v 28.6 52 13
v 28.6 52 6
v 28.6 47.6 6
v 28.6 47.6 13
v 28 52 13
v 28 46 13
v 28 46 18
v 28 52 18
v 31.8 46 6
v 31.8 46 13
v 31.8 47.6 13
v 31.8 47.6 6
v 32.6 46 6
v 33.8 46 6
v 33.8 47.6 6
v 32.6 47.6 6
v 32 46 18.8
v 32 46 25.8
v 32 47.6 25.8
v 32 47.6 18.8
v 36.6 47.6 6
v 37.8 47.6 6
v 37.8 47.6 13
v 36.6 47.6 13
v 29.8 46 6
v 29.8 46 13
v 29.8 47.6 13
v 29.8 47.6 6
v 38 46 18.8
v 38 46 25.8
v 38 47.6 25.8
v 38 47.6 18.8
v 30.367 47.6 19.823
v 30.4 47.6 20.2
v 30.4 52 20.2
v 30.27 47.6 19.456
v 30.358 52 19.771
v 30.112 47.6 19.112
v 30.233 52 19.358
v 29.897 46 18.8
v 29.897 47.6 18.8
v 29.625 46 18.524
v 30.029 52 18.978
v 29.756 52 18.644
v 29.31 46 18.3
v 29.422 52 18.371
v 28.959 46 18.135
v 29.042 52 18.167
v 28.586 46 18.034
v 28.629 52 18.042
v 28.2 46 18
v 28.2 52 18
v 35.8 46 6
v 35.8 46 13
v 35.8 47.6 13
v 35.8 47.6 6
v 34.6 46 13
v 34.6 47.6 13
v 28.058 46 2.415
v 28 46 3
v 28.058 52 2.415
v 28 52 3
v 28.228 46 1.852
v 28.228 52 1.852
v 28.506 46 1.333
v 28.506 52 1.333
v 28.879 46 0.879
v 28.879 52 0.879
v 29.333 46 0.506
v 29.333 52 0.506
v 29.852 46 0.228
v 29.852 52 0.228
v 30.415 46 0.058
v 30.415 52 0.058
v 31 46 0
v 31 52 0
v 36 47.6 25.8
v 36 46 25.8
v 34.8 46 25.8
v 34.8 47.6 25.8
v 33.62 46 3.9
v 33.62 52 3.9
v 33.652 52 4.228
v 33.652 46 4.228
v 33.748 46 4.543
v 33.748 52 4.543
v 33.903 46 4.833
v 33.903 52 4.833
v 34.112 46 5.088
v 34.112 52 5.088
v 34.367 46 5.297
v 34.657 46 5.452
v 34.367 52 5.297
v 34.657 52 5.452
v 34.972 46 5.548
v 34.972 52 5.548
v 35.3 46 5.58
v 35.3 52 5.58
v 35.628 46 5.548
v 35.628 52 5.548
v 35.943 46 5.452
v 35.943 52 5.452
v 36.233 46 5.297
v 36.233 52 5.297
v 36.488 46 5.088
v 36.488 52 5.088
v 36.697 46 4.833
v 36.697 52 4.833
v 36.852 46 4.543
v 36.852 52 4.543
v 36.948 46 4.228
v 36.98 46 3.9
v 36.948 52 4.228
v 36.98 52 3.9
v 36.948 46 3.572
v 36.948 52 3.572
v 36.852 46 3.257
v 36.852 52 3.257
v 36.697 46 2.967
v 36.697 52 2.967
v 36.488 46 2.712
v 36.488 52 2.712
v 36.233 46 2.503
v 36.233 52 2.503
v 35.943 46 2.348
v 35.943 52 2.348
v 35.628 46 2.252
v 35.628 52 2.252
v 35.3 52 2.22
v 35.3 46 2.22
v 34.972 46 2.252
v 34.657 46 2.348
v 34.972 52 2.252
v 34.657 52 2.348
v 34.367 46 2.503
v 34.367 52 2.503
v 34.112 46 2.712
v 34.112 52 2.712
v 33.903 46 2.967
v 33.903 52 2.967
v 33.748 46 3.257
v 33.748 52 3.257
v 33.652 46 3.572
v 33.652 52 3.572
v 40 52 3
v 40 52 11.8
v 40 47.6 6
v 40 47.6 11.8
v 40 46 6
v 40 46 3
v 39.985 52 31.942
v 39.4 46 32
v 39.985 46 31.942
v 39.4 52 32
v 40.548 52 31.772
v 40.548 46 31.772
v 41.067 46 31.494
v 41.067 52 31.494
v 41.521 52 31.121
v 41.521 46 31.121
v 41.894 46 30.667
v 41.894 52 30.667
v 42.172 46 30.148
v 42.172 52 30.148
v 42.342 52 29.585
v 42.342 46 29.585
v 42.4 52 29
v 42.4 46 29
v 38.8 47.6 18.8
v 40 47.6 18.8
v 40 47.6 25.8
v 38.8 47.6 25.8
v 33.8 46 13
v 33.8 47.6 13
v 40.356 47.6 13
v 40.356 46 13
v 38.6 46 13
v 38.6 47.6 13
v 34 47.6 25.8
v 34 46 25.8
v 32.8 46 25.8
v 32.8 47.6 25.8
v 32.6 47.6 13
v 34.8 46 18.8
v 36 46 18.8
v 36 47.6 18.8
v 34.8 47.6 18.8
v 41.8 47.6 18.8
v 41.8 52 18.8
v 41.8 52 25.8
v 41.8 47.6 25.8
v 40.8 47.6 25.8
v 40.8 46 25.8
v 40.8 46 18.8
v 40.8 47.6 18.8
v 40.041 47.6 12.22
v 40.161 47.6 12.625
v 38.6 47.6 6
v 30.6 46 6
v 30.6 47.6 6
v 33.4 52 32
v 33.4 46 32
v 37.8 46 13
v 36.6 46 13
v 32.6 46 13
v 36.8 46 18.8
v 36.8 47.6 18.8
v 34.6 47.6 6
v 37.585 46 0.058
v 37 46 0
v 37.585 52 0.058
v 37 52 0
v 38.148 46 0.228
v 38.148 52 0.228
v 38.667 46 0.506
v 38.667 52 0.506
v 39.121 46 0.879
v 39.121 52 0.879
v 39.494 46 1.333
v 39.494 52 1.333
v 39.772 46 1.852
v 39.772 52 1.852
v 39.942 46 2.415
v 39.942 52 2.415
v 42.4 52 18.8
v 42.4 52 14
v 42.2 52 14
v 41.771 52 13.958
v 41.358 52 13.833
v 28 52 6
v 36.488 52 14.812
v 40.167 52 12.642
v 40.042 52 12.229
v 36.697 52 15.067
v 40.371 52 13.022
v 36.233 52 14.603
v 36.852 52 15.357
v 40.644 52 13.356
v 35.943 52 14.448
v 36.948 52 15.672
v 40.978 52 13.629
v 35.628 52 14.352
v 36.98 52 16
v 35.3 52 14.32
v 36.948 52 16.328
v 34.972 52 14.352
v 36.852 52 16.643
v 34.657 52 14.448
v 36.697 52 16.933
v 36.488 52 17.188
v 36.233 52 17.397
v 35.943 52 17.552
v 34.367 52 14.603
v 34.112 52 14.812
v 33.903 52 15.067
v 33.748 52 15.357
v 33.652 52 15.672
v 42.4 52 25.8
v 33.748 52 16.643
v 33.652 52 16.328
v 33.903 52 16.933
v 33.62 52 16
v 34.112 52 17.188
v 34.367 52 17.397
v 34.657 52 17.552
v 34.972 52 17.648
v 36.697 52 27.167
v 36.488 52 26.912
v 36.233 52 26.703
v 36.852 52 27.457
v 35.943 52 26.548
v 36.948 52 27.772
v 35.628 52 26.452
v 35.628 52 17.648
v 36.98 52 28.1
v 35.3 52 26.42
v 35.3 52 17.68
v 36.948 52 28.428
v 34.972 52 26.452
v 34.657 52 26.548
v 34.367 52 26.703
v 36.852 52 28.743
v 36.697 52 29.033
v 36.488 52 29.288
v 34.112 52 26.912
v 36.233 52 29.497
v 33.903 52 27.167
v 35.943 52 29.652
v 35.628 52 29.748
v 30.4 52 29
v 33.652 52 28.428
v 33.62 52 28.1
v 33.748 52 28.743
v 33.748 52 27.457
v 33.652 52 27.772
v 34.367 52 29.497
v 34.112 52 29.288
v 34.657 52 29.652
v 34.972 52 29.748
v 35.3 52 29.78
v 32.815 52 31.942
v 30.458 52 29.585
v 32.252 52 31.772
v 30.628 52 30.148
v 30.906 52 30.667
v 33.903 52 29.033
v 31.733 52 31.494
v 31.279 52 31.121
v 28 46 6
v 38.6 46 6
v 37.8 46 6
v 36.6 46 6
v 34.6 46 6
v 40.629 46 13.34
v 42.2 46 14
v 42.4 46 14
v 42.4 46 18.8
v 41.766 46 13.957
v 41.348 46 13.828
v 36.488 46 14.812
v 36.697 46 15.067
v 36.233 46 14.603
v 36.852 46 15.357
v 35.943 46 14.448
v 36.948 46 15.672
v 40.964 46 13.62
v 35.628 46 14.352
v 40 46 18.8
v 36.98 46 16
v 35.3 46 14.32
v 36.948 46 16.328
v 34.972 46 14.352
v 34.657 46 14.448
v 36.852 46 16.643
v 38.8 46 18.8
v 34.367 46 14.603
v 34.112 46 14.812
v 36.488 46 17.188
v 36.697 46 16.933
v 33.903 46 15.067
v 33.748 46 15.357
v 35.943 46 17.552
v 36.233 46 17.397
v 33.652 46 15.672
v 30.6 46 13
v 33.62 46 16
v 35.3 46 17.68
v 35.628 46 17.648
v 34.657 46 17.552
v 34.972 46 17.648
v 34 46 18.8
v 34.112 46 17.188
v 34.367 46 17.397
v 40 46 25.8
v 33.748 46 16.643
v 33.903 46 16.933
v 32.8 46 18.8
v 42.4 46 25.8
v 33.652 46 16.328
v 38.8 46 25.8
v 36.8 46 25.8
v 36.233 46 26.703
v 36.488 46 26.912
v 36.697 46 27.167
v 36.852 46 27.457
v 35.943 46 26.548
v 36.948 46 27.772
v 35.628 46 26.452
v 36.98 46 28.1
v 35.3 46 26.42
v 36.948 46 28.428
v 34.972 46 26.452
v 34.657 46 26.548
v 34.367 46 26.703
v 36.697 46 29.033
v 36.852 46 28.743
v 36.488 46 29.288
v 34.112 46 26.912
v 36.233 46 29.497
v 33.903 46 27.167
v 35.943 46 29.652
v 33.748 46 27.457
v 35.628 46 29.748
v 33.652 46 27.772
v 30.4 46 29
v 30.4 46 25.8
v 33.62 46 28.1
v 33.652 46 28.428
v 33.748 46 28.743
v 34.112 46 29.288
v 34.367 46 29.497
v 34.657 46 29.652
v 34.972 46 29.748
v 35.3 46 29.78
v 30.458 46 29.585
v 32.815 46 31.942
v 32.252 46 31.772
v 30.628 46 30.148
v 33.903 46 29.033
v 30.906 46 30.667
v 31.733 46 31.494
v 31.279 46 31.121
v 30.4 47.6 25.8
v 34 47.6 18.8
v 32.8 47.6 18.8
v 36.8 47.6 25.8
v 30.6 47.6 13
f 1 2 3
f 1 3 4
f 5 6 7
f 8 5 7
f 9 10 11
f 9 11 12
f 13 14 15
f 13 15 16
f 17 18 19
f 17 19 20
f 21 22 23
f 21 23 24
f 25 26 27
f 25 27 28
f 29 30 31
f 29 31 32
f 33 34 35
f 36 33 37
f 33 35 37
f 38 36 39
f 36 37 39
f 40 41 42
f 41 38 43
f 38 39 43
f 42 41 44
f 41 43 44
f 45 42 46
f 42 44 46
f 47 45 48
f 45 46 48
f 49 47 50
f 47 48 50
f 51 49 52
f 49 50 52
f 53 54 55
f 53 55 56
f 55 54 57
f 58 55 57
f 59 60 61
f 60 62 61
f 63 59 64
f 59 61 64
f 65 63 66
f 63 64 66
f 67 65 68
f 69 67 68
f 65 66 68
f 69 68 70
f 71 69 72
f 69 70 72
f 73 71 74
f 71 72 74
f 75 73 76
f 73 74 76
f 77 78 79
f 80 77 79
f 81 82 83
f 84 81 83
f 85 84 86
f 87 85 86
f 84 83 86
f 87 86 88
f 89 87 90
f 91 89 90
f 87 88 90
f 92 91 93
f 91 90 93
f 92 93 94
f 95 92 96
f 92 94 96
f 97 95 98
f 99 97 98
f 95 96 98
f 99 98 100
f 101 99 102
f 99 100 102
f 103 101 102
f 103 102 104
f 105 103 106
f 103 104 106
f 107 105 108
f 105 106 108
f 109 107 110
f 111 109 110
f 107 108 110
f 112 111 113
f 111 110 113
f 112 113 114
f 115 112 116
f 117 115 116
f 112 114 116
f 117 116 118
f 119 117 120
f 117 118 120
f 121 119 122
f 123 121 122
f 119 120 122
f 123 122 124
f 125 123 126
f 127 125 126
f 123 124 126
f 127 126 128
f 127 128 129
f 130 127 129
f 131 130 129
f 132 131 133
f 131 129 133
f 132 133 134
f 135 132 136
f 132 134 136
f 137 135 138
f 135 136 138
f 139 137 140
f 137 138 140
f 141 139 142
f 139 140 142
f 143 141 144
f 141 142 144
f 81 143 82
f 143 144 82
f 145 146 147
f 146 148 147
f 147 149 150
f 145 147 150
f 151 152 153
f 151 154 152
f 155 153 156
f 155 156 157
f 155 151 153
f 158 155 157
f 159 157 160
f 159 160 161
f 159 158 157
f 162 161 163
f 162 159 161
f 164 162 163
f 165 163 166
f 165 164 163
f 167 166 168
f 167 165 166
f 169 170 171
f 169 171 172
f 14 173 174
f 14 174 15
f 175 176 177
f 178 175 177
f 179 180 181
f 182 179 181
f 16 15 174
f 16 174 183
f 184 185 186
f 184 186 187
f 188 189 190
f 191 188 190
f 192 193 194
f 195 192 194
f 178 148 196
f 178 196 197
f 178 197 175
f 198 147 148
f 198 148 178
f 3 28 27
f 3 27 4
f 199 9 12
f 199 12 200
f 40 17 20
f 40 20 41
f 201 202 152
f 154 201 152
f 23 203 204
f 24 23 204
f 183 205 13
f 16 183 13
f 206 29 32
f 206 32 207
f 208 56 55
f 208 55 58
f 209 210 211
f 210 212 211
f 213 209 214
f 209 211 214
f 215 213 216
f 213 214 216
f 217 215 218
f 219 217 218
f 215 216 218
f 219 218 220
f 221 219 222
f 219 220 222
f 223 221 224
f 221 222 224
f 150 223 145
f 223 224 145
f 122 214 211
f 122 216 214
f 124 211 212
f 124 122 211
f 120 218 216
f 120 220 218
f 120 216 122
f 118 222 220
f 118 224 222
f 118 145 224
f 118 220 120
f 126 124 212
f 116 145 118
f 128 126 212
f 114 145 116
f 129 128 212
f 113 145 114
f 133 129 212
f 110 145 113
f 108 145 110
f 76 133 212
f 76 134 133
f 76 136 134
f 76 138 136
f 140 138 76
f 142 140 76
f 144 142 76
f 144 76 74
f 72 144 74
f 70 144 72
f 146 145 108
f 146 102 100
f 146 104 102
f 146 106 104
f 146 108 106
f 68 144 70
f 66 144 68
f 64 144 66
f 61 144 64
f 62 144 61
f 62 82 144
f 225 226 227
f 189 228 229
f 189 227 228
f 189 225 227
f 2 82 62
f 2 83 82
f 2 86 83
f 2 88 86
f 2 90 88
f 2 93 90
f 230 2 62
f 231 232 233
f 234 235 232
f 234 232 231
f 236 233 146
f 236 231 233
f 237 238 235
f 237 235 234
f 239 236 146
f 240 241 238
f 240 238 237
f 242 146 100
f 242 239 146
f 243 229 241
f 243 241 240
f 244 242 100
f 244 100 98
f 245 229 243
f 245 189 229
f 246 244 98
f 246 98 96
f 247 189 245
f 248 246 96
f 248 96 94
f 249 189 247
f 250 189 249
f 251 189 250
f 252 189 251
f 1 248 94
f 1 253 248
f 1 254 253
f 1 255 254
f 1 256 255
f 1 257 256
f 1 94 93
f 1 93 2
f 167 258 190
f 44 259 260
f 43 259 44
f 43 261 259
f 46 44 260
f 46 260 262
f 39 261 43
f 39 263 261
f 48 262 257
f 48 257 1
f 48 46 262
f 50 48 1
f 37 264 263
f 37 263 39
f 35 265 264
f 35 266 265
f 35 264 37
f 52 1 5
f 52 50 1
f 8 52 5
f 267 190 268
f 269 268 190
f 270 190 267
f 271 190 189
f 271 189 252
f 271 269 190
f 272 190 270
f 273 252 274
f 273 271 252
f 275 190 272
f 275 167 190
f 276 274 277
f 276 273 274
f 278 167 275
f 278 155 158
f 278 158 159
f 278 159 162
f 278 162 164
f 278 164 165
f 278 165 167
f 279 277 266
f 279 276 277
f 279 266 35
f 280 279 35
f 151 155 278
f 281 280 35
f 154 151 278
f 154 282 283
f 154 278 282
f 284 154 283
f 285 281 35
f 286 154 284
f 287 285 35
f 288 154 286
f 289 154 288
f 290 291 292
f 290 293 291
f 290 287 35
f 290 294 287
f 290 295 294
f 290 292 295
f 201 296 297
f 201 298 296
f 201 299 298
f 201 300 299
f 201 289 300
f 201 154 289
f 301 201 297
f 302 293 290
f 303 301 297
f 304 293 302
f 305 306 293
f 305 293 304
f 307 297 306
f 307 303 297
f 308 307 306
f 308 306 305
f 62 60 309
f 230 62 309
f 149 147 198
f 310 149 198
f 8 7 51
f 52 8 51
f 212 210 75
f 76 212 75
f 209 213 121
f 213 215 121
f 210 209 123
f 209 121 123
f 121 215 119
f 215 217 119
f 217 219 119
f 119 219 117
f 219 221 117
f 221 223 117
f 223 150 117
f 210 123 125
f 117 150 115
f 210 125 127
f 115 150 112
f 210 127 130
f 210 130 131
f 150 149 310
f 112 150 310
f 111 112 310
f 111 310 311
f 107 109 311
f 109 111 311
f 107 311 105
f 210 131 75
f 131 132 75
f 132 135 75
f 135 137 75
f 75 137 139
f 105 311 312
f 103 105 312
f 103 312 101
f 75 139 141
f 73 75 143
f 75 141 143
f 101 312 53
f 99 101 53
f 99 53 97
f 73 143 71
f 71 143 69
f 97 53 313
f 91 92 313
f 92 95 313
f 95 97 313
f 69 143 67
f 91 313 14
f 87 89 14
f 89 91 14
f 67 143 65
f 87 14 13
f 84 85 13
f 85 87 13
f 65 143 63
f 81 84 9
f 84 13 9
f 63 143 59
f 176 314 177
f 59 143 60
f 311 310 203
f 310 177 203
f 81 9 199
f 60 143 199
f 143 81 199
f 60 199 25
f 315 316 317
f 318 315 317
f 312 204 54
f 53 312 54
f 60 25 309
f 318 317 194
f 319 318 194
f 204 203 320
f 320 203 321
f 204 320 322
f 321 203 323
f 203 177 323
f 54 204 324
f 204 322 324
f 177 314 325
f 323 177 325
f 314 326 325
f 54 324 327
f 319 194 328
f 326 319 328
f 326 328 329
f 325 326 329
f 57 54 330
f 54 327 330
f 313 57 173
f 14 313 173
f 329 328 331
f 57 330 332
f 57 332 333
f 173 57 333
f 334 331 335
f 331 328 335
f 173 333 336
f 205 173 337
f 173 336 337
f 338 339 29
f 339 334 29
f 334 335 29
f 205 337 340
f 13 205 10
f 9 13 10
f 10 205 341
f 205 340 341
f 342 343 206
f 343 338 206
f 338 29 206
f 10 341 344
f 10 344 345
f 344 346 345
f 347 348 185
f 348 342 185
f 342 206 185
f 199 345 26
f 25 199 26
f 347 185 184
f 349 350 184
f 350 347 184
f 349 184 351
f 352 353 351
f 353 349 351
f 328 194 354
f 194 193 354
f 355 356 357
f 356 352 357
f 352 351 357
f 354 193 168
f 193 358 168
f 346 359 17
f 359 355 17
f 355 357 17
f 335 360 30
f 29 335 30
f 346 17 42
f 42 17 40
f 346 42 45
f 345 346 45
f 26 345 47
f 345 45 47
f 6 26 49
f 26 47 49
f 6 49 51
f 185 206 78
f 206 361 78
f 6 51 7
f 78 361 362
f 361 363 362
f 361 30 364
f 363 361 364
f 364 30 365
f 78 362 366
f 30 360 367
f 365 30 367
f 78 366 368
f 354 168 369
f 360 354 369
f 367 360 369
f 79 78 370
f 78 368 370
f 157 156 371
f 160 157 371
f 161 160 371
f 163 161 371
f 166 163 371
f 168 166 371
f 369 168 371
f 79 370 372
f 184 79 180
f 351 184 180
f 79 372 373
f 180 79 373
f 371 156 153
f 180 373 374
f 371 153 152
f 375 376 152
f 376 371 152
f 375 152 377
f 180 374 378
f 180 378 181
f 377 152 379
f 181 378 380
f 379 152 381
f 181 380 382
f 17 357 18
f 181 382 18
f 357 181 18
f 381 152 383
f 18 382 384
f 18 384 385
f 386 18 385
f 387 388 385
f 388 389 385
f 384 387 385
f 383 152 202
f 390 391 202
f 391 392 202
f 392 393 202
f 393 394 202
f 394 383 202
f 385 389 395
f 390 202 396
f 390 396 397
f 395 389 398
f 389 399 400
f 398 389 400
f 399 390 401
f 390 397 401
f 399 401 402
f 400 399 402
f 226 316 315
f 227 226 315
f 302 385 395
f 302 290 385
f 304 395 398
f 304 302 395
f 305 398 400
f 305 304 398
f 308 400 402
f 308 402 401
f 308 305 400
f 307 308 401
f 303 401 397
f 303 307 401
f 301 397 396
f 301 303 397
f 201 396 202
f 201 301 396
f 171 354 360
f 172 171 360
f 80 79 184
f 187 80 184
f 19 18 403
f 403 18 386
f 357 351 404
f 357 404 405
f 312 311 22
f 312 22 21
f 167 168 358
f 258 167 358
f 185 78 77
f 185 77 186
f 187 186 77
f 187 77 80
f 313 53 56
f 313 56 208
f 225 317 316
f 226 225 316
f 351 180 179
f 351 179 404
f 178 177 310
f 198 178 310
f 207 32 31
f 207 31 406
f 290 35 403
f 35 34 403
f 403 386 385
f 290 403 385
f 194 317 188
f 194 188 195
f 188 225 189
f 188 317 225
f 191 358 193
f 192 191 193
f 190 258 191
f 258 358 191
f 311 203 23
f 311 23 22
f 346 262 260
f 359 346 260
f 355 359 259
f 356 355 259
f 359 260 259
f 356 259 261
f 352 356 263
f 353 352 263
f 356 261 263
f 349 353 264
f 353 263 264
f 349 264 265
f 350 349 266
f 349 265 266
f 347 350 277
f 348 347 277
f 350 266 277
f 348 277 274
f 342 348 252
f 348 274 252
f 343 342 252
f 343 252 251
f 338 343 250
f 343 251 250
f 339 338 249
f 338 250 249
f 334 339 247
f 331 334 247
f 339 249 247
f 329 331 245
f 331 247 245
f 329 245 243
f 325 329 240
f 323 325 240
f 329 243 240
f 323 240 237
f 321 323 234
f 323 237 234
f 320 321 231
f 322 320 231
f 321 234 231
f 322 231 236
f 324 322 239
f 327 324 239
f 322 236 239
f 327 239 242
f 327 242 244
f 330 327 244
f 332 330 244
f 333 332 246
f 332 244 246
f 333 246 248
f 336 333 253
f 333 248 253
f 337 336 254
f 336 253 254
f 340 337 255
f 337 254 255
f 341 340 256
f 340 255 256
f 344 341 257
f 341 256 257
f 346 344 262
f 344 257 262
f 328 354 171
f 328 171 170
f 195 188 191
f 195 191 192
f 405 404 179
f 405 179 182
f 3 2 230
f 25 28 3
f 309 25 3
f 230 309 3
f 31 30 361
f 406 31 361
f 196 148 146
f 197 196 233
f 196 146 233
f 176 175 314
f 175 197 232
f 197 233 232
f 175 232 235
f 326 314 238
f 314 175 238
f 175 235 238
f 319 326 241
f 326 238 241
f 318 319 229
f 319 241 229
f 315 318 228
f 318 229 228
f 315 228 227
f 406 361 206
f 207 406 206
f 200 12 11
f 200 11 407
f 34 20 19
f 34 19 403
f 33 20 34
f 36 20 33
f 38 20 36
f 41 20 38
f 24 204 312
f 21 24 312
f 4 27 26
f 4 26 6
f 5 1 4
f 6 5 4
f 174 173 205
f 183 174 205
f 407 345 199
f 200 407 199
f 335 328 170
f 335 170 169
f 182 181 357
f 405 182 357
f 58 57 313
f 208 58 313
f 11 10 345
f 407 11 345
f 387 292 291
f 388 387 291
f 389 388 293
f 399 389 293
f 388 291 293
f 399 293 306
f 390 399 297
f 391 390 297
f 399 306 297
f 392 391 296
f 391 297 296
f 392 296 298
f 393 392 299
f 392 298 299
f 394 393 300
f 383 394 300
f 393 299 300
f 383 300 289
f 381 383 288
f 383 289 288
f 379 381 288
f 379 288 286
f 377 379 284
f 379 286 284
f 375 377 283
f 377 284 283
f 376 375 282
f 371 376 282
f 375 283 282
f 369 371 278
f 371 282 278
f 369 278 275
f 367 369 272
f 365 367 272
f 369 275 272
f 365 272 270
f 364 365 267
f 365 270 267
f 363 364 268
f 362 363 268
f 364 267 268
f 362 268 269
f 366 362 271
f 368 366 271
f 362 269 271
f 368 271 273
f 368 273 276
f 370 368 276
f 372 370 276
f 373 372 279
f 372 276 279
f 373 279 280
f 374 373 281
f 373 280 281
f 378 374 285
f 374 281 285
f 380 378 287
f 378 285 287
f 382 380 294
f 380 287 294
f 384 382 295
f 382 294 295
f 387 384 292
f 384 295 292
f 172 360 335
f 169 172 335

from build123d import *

# Parameters (mm, degrees)
PAD_DEPTH       = 6
SKETCH018_R     = 1.68
POCKET_DEPTH    = 6
SKETCH019_W     = 0.6
SKETCH019_H     = 7
POCKET001_DEPTH = 6
SKETCH020_W     = 1.2
SKETCH020_H     = 7
SKETCH020_W_2   = 1.51546
SKETCH020_W_3   = 1.6
POCKET002_DEPTH = 1.6
FILLET_R        = 2.2
FILLET001_R     = 3


with BuildPart() as part:
    # Sketch017 → Pad (new body)
    with BuildSketch(Plane(origin=(28, 46, 0), x_dir=(-1, 0, 0), z_dir=(0, 1, 0))):
        Polygon((-14.4, 32), (-14.4, 14), (-12, 14), (-12, 0), (0, 0), (0, 18), (-2.4, 18), (-2.4, 32), align=None)
    extrude(amount=PAD_DEPTH)

    # Sketch018 → Pocket (cut)
    with BuildSketch(Plane(origin=(28, 52, 0), x_dir=(-1, 0, 0), z_dir=(0, 1, 0))):
        with Locations((-7.3, 3.9)):
            Circle(SKETCH018_R)
        with Locations((-7.3, 16)):
            Circle(SKETCH018_R)
        with Locations((-7.3, 28.1)):
            Circle(SKETCH018_R)
    extrude(amount=-POCKET_DEPTH, mode=Mode.SUBTRACT)

    # Sketch019 → Pocket001 (cut)
    with BuildSketch(Plane(origin=(28, 52, 0), x_dir=(-1, 0, 0), z_dir=(0, 1, 0))):
        with Locations((-0.3, 9.5)):
            Rectangle(SKETCH019_W, SKETCH019_H)
        with Locations((-14.1, 22.3)):
            Rectangle(SKETCH019_W, SKETCH019_H)
    extrude(amount=-POCKET001_DEPTH, mode=Mode.SUBTRACT)

    # Sketch020 → Pocket002 (cut)
    with BuildSketch(Plane(origin=(28, 46, 0), x_dir=(-1, 0, 0), z_dir=(0, -1, 0))):
        with Locations((-7.2, -9.5)):
            Rectangle(SKETCH020_W, SKETCH020_H)
        with Locations((-5.2, -9.5)):
            Rectangle(SKETCH020_W, SKETCH020_H)
        with Locations((-3.2, -9.5)):
            Rectangle(SKETCH020_W, SKETCH020_H)
        with Locations((-1.2, -9.5)):
            Rectangle(SKETCH020_W, SKETCH020_H)
        with Locations((-11.35773, -9.5)):
            Rectangle(SKETCH020_W_2, SKETCH020_H)
        with Locations((-9.2, -9.5)):
            Rectangle(SKETCH020_W, SKETCH020_H)
        with Locations((-13.4, -22.3)):
            Rectangle(SKETCH020_W, SKETCH020_H)
        with Locations((-11.4, -22.3)):
            Rectangle(SKETCH020_W, SKETCH020_H)
        with Locations((-9.4, -22.3)):
            Rectangle(SKETCH020_W, SKETCH020_H)
        with Locations((-7.4, -22.3)):
            Rectangle(SKETCH020_W, SKETCH020_H)
        with Locations((-5.4, -22.3)):
            Rectangle(SKETCH020_W, SKETCH020_H)
        with Locations((-3.2, -22.3)):
            Rectangle(SKETCH020_W_3, SKETCH020_H)
    extrude(amount=-POCKET002_DEPTH, mode=Mode.SUBTRACT)

    # Fillet
    fillet_edges = [part.edges().sort_by_distance(p)[0] for p in [
        (40, 49, 14),
        (30.4, 49, 18),
    ]]
    fillet(fillet_edges, radius=FILLET_R)

    # Fillet001
    fillet001_edges = [part.edges().sort_by_distance(p)[0] for p in [
        (30.4, 49, 32),
        (42.4, 49, 32),
        (28, 49, 0),
        (40, 49, 0),
    ]]
    fillet(fillet001_edges, radius=FILLET001_R)


solid = part.part
